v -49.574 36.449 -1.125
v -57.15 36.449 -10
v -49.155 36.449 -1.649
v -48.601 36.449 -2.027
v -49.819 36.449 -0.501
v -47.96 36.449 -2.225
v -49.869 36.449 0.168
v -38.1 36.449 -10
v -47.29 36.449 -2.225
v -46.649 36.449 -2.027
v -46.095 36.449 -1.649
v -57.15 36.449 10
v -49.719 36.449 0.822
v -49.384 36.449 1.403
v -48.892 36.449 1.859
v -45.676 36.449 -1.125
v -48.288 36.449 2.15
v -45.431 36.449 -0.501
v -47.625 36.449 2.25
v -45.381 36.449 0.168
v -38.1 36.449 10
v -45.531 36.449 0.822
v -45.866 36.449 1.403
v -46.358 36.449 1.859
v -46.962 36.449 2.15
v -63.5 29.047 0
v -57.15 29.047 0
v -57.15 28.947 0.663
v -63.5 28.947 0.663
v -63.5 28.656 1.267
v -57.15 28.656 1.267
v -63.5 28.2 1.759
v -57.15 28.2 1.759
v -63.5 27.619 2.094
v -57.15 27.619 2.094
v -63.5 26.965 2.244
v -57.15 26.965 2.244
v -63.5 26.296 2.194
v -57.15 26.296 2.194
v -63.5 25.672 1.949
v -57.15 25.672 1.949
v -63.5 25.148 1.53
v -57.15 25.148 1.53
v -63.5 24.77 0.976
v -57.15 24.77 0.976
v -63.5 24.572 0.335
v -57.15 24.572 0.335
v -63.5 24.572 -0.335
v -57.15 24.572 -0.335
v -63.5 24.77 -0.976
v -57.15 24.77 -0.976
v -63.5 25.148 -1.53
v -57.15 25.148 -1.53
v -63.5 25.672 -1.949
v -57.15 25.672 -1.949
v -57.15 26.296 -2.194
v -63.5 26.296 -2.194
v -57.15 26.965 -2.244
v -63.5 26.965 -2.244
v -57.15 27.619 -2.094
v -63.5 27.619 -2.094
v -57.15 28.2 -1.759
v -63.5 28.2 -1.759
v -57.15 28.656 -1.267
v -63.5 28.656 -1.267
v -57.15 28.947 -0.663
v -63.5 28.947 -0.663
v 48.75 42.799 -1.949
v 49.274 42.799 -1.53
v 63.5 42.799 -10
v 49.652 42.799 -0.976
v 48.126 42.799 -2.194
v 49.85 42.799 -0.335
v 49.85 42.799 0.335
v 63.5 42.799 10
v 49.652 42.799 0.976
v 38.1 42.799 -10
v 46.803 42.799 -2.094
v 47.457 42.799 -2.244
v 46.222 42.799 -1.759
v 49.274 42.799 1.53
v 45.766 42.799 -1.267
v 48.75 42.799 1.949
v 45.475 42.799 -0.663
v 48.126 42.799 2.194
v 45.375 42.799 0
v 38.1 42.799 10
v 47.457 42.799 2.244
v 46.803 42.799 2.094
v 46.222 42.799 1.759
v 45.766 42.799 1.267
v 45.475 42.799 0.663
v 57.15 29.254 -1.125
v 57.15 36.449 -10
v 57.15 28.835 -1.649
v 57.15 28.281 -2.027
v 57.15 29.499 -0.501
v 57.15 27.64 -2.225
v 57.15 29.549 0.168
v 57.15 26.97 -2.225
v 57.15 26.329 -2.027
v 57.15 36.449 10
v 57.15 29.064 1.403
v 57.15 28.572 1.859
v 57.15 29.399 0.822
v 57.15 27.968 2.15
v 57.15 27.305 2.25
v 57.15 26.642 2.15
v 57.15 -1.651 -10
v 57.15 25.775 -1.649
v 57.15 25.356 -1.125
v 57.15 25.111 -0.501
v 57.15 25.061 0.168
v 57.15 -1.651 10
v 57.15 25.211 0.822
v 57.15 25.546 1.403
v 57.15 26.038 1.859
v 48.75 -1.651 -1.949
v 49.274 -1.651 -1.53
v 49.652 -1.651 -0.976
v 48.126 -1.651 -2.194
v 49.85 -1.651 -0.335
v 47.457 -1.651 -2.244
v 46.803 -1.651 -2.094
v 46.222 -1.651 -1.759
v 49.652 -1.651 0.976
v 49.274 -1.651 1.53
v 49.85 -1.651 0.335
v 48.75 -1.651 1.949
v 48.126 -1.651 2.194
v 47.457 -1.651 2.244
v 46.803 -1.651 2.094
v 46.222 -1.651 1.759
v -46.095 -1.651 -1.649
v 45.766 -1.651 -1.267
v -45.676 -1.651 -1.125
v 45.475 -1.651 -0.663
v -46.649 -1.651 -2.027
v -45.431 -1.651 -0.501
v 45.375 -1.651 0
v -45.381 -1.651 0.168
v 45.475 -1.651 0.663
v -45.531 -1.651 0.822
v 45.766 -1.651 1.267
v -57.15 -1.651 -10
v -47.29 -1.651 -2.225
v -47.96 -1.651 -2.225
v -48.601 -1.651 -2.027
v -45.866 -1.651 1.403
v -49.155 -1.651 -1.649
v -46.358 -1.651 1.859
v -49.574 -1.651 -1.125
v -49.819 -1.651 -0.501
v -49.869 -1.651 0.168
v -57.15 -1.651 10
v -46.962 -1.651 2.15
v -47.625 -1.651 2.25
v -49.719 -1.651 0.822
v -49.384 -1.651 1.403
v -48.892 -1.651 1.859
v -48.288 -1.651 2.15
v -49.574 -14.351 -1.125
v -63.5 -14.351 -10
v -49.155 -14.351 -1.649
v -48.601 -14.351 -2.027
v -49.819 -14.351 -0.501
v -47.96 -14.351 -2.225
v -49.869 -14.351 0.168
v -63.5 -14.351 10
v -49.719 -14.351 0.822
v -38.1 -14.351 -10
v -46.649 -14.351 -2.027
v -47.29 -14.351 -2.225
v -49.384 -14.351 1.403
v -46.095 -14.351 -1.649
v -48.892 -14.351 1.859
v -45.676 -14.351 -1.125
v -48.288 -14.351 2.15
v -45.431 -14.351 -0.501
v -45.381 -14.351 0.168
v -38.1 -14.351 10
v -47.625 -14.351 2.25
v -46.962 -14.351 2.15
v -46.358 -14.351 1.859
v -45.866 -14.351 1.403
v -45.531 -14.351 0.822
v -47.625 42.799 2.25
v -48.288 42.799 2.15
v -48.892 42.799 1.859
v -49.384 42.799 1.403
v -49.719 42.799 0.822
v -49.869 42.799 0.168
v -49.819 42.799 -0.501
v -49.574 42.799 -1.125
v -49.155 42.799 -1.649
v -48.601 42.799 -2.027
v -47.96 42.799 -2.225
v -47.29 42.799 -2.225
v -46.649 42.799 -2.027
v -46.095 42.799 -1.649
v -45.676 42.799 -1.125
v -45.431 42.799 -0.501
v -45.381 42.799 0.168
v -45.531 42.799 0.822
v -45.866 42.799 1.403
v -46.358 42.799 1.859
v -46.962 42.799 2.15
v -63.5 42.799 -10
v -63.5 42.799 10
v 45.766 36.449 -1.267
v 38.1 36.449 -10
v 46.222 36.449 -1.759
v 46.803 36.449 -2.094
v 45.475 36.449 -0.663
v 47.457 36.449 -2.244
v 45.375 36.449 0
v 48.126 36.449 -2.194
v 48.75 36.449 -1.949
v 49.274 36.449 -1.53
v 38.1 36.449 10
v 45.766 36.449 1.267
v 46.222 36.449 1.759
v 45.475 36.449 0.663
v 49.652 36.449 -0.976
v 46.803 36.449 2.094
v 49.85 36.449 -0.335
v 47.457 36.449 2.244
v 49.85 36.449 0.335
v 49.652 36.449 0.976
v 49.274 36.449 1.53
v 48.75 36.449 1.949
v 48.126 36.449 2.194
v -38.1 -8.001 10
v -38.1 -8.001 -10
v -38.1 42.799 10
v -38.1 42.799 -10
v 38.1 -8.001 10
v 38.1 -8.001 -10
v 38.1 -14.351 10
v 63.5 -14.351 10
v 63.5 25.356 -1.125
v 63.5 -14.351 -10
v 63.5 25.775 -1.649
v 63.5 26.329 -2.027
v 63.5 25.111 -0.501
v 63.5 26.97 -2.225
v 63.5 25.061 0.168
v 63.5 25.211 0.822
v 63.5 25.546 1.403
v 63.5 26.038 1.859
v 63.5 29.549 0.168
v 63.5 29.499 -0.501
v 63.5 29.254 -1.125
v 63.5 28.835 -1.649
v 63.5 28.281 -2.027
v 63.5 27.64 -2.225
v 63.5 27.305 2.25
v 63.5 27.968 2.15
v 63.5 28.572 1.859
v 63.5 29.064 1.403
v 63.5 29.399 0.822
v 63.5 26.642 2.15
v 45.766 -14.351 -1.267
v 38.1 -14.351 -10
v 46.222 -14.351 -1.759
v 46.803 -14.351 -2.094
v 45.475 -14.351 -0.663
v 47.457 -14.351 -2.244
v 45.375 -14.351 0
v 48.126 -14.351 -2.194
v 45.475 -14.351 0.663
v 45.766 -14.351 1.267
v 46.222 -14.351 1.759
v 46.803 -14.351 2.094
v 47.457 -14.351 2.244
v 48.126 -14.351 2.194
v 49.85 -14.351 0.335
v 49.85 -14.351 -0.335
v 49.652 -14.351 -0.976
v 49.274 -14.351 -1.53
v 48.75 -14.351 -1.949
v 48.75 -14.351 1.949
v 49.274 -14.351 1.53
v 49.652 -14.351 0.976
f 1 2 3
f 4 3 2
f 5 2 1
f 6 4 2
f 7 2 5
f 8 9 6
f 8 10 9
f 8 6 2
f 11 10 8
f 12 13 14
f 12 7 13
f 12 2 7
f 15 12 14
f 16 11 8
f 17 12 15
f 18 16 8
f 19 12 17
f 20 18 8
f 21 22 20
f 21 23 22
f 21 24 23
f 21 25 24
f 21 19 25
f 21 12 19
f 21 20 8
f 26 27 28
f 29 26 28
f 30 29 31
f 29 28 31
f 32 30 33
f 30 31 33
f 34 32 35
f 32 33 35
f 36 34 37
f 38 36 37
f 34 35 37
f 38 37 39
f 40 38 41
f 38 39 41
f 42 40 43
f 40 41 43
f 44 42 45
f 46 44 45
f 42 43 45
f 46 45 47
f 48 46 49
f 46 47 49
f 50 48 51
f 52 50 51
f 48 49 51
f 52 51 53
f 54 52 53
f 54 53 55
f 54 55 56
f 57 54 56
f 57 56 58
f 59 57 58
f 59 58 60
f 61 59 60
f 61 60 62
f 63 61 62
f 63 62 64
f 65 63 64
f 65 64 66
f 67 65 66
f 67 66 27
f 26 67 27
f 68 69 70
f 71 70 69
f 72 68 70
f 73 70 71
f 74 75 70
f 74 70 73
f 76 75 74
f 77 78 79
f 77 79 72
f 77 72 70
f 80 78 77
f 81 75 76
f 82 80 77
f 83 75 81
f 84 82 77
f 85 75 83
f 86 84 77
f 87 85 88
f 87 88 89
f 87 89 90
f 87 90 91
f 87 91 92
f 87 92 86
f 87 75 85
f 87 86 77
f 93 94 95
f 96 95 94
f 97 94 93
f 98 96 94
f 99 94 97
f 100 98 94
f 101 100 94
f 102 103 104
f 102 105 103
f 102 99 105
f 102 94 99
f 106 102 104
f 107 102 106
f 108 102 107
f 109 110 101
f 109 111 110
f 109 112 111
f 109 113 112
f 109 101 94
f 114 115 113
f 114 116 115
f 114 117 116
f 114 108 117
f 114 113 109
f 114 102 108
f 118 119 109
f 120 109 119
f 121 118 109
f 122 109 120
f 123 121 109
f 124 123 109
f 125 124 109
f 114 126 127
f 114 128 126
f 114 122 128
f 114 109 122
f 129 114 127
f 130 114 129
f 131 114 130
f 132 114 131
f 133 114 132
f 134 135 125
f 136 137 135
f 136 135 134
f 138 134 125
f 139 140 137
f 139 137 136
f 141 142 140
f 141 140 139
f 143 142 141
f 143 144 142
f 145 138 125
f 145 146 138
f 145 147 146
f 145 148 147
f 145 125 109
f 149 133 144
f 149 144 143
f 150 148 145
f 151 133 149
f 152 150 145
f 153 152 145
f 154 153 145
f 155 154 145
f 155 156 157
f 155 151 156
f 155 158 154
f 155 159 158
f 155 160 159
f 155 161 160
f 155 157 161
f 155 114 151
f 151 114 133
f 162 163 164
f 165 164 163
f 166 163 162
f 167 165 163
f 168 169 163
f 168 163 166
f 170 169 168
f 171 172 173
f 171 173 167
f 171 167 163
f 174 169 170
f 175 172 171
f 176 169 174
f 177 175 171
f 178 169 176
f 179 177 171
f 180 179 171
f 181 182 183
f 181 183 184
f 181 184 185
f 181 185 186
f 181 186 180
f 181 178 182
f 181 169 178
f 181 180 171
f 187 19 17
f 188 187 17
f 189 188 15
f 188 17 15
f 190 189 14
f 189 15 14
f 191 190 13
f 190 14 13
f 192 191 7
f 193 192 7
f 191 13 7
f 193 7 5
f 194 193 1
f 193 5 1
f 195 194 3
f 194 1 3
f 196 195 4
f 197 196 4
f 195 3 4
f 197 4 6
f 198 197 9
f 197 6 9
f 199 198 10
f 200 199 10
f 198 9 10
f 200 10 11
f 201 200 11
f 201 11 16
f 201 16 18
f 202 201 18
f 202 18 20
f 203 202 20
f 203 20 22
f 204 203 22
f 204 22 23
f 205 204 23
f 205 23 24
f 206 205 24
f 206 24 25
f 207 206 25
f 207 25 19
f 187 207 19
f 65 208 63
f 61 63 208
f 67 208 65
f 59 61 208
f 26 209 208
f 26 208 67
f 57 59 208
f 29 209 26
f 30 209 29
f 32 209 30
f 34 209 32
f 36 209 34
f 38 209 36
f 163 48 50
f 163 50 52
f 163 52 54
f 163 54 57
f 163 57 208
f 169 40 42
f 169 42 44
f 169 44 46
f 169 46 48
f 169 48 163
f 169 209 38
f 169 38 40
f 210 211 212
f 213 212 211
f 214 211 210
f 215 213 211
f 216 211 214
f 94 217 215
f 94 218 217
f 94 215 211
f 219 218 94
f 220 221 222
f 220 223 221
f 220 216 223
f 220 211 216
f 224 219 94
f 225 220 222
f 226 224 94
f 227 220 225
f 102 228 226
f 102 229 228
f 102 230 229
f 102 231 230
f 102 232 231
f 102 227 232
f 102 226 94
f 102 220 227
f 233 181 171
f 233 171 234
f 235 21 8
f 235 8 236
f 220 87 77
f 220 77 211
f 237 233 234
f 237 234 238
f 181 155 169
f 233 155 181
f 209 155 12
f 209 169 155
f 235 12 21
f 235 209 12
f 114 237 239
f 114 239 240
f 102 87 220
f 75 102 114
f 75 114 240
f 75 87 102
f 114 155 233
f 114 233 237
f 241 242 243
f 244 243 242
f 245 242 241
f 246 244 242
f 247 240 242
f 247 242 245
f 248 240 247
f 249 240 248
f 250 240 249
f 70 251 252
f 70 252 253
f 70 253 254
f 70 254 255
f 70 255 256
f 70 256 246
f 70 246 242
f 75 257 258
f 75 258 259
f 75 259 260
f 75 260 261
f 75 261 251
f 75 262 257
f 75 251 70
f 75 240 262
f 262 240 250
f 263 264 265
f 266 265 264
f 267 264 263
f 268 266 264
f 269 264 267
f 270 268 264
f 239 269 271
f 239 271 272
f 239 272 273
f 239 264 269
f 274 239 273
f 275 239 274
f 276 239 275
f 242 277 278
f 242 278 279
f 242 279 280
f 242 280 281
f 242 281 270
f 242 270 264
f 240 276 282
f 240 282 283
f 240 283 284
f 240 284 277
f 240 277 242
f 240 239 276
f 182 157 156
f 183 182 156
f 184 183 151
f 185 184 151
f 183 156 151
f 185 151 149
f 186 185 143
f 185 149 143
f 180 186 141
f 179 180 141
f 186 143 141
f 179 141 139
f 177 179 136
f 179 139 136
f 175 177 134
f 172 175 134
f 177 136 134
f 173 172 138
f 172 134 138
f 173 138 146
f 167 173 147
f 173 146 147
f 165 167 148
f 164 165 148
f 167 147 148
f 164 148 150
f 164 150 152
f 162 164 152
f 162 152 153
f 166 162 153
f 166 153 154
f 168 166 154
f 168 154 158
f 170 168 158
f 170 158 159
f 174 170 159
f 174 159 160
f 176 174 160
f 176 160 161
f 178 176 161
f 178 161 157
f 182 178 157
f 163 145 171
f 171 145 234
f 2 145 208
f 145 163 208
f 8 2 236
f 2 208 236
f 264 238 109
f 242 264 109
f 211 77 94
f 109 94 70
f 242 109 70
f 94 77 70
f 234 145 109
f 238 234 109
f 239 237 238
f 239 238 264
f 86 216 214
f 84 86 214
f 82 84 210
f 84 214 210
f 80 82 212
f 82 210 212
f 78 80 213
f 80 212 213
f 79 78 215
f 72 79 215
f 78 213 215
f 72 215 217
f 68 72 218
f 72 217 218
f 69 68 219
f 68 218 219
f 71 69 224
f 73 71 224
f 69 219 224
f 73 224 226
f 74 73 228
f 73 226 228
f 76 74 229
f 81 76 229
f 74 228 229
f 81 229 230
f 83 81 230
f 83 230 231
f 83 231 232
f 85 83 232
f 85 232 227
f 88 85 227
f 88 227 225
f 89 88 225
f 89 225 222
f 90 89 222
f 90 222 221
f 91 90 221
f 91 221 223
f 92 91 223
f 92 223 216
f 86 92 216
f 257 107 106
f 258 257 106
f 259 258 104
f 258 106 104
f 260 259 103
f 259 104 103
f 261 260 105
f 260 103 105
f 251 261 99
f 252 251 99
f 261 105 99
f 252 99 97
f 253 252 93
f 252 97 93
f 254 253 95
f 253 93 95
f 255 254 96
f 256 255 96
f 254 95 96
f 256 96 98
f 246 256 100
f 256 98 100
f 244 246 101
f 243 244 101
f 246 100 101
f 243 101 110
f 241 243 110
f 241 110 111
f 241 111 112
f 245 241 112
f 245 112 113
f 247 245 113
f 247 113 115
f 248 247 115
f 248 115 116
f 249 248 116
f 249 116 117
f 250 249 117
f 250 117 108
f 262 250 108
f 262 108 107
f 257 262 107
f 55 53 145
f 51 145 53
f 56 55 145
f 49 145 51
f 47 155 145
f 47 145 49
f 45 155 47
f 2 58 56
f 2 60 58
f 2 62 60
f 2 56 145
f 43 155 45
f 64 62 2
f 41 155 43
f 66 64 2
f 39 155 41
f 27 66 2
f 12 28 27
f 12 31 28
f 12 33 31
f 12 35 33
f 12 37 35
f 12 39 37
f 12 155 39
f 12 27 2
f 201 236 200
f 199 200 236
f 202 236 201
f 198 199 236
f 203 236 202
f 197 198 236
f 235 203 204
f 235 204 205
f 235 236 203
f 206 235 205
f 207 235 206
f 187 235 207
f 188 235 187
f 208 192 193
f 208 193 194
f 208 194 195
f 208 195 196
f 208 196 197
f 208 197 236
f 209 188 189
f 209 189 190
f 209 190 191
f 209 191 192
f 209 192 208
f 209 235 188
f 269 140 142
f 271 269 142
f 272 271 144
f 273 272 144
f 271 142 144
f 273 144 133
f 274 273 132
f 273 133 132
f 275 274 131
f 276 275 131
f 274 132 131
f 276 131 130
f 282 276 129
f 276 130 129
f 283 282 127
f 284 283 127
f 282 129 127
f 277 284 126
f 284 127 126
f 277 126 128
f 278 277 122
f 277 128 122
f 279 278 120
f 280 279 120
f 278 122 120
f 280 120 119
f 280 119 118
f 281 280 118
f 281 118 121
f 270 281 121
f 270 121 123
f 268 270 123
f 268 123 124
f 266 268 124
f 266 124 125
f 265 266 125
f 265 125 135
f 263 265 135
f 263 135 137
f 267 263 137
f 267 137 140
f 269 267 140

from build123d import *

# Parameters (mm, degrees)
BOSS_EXTRUDE1_DEPTH = 10
CUT_EXTRUDE1_REACH  = 80.154
SKETCH2_R           = 2.25
CUT_EXTRUDE2_REACH  = 130.406
SKETCH3_R           = 2.25
CUT_EXTRUDE3_REACH  = 83.932
SKETCH4_R           = 2.25
CUT_EXTRUDE4_REACH  = 130.406
SKETCH5_R           = 2.25


with BuildPart() as part:
    # Sketch1 → Boss-Extrude1 (new, symmetric)
    with BuildSketch(Plane.XY):
        Polygon((-57.15, -1.651), (-57.15, 36.449), (-38.1, 36.449), (-38.1, 42.799), (-63.5, 42.799), (-63.5, -3.175), (-63.5, -14.351), (-38.1, -14.351), (-38.1, -8.001), (38.1, -8.001), (38.1, -14.351), (63.5, -14.351), (63.5, -3.175), (63.5, 42.799), (38.1, 42.799), (38.1, 36.449), (57.15, 36.449), (57.15, -1.651), align=None)
    extrude(amount=BOSS_EXTRUDE1_DEPTH, both=True)

    # Sketch2 → Cut-Extrude1 (cut, up to next)
    with BuildSketch(Plane(origin=(0, -1.651, 0), x_dir=(1, 0, 0), z_dir=(0, 1, 0)), mode=Mode.PRIVATE) as cut_extrude1_sk1:
        with Locations(Location((-47.625, 0, 0), (0, 0, 270))):
            Circle(SKETCH2_R)
    cut_extrude1_tool1 = extrude(cut_extrude1_sk1.sketch, amount=-CUT_EXTRUDE1_REACH, mode=Mode.PRIVATE) & part.part
    # Sketch2 → Cut-Extrude1 (cut, up to next)
    with BuildSketch(Plane(origin=(0, -1.651, 0), x_dir=(1, 0, 0), z_dir=(0, 1, 0)), mode=Mode.PRIVATE) as cut_extrude1_sk2:
        with Locations(Location((47.625, 0, 0), (0, 0, 180))):
            Circle(SKETCH2_R)
    cut_extrude1_tool2 = extrude(cut_extrude1_sk2.sketch, amount=-CUT_EXTRUDE1_REACH, mode=Mode.PRIVATE) & part.part
    add(cut_extrude1_tool1.solids().sort_by_distance((-47.625, -1.651, 0))[0], mode=Mode.SUBTRACT)
    add(cut_extrude1_tool2.solids().sort_by_distance((47.625, -1.651, 0))[0], mode=Mode.SUBTRACT)

    # Sketch3 → Cut-Extrude2 (cut, up to next)
    with BuildSketch(Plane(origin=(-57.15, 0, 0), x_dir=(0, 0, -1), z_dir=(1, 0, 0)), mode=Mode.PRIVATE) as cut_extrude2_sk1:
        with Locations(Location((0, 26.797, 0), (0, 0, 90))):
            Circle(SKETCH3_R)
    cut_extrude2_tool1 = extrude(cut_extrude2_sk1.sketch, amount=-CUT_EXTRUDE2_REACH, mode=Mode.PRIVATE) & part.part
    add(cut_extrude2_tool1.solids().sort_by_distance((-57.15, 26.797, 0))[0], mode=Mode.SUBTRACT)

    # Sketch4 → Cut-Extrude3 (cut, up to next)
    with BuildSketch(Plane.XZ.offset(-36.449), mode=Mode.PRIVATE) as cut_extrude3_sk1:
        with Locations(Location((-47.625, 0, 0), (0, 0, 90))):
            Circle(SKETCH4_R)
    cut_extrude3_tool1 = extrude(cut_extrude3_sk1.sketch, amount=-CUT_EXTRUDE3_REACH, mode=Mode.PRIVATE) & part.part
    # Sketch4 → Cut-Extrude3 (cut, up to next)
    with BuildSketch(Plane.XZ.offset(-36.449), mode=Mode.PRIVATE) as cut_extrude3_sk2:
        with Locations(Location((47.625, 0, 0), (0, 0, 180))):
            Circle(SKETCH4_R)
    cut_extrude3_tool2 = extrude(cut_extrude3_sk2.sketch, amount=-CUT_EXTRUDE3_REACH, mode=Mode.PRIVATE) & part.part
    add(cut_extrude3_tool1.solids().sort_by_distance((-47.625, 36.449, 0))[0], mode=Mode.SUBTRACT)
    add(cut_extrude3_tool2.solids().sort_by_distance((47.625, 36.449, 0))[0], mode=Mode.SUBTRACT)

    # Sketch5 → Cut-Extrude4 (cut, up to next)
    with BuildSketch(Plane.ZY.offset(-57.15), mode=Mode.PRIVATE) as cut_extrude4_sk1:
        with Locations((0, 27.305)):
            Circle(SKETCH5_R)
    cut_extrude4_tool1 = extrude(cut_extrude4_sk1.sketch, amount=-CUT_EXTRUDE4_REACH, mode=Mode.PRIVATE) & part.part
    add(cut_extrude4_tool1.solids().sort_by_distance((57.15, 27.305, 0))[0], mode=Mode.SUBTRACT)


solid = part.part
